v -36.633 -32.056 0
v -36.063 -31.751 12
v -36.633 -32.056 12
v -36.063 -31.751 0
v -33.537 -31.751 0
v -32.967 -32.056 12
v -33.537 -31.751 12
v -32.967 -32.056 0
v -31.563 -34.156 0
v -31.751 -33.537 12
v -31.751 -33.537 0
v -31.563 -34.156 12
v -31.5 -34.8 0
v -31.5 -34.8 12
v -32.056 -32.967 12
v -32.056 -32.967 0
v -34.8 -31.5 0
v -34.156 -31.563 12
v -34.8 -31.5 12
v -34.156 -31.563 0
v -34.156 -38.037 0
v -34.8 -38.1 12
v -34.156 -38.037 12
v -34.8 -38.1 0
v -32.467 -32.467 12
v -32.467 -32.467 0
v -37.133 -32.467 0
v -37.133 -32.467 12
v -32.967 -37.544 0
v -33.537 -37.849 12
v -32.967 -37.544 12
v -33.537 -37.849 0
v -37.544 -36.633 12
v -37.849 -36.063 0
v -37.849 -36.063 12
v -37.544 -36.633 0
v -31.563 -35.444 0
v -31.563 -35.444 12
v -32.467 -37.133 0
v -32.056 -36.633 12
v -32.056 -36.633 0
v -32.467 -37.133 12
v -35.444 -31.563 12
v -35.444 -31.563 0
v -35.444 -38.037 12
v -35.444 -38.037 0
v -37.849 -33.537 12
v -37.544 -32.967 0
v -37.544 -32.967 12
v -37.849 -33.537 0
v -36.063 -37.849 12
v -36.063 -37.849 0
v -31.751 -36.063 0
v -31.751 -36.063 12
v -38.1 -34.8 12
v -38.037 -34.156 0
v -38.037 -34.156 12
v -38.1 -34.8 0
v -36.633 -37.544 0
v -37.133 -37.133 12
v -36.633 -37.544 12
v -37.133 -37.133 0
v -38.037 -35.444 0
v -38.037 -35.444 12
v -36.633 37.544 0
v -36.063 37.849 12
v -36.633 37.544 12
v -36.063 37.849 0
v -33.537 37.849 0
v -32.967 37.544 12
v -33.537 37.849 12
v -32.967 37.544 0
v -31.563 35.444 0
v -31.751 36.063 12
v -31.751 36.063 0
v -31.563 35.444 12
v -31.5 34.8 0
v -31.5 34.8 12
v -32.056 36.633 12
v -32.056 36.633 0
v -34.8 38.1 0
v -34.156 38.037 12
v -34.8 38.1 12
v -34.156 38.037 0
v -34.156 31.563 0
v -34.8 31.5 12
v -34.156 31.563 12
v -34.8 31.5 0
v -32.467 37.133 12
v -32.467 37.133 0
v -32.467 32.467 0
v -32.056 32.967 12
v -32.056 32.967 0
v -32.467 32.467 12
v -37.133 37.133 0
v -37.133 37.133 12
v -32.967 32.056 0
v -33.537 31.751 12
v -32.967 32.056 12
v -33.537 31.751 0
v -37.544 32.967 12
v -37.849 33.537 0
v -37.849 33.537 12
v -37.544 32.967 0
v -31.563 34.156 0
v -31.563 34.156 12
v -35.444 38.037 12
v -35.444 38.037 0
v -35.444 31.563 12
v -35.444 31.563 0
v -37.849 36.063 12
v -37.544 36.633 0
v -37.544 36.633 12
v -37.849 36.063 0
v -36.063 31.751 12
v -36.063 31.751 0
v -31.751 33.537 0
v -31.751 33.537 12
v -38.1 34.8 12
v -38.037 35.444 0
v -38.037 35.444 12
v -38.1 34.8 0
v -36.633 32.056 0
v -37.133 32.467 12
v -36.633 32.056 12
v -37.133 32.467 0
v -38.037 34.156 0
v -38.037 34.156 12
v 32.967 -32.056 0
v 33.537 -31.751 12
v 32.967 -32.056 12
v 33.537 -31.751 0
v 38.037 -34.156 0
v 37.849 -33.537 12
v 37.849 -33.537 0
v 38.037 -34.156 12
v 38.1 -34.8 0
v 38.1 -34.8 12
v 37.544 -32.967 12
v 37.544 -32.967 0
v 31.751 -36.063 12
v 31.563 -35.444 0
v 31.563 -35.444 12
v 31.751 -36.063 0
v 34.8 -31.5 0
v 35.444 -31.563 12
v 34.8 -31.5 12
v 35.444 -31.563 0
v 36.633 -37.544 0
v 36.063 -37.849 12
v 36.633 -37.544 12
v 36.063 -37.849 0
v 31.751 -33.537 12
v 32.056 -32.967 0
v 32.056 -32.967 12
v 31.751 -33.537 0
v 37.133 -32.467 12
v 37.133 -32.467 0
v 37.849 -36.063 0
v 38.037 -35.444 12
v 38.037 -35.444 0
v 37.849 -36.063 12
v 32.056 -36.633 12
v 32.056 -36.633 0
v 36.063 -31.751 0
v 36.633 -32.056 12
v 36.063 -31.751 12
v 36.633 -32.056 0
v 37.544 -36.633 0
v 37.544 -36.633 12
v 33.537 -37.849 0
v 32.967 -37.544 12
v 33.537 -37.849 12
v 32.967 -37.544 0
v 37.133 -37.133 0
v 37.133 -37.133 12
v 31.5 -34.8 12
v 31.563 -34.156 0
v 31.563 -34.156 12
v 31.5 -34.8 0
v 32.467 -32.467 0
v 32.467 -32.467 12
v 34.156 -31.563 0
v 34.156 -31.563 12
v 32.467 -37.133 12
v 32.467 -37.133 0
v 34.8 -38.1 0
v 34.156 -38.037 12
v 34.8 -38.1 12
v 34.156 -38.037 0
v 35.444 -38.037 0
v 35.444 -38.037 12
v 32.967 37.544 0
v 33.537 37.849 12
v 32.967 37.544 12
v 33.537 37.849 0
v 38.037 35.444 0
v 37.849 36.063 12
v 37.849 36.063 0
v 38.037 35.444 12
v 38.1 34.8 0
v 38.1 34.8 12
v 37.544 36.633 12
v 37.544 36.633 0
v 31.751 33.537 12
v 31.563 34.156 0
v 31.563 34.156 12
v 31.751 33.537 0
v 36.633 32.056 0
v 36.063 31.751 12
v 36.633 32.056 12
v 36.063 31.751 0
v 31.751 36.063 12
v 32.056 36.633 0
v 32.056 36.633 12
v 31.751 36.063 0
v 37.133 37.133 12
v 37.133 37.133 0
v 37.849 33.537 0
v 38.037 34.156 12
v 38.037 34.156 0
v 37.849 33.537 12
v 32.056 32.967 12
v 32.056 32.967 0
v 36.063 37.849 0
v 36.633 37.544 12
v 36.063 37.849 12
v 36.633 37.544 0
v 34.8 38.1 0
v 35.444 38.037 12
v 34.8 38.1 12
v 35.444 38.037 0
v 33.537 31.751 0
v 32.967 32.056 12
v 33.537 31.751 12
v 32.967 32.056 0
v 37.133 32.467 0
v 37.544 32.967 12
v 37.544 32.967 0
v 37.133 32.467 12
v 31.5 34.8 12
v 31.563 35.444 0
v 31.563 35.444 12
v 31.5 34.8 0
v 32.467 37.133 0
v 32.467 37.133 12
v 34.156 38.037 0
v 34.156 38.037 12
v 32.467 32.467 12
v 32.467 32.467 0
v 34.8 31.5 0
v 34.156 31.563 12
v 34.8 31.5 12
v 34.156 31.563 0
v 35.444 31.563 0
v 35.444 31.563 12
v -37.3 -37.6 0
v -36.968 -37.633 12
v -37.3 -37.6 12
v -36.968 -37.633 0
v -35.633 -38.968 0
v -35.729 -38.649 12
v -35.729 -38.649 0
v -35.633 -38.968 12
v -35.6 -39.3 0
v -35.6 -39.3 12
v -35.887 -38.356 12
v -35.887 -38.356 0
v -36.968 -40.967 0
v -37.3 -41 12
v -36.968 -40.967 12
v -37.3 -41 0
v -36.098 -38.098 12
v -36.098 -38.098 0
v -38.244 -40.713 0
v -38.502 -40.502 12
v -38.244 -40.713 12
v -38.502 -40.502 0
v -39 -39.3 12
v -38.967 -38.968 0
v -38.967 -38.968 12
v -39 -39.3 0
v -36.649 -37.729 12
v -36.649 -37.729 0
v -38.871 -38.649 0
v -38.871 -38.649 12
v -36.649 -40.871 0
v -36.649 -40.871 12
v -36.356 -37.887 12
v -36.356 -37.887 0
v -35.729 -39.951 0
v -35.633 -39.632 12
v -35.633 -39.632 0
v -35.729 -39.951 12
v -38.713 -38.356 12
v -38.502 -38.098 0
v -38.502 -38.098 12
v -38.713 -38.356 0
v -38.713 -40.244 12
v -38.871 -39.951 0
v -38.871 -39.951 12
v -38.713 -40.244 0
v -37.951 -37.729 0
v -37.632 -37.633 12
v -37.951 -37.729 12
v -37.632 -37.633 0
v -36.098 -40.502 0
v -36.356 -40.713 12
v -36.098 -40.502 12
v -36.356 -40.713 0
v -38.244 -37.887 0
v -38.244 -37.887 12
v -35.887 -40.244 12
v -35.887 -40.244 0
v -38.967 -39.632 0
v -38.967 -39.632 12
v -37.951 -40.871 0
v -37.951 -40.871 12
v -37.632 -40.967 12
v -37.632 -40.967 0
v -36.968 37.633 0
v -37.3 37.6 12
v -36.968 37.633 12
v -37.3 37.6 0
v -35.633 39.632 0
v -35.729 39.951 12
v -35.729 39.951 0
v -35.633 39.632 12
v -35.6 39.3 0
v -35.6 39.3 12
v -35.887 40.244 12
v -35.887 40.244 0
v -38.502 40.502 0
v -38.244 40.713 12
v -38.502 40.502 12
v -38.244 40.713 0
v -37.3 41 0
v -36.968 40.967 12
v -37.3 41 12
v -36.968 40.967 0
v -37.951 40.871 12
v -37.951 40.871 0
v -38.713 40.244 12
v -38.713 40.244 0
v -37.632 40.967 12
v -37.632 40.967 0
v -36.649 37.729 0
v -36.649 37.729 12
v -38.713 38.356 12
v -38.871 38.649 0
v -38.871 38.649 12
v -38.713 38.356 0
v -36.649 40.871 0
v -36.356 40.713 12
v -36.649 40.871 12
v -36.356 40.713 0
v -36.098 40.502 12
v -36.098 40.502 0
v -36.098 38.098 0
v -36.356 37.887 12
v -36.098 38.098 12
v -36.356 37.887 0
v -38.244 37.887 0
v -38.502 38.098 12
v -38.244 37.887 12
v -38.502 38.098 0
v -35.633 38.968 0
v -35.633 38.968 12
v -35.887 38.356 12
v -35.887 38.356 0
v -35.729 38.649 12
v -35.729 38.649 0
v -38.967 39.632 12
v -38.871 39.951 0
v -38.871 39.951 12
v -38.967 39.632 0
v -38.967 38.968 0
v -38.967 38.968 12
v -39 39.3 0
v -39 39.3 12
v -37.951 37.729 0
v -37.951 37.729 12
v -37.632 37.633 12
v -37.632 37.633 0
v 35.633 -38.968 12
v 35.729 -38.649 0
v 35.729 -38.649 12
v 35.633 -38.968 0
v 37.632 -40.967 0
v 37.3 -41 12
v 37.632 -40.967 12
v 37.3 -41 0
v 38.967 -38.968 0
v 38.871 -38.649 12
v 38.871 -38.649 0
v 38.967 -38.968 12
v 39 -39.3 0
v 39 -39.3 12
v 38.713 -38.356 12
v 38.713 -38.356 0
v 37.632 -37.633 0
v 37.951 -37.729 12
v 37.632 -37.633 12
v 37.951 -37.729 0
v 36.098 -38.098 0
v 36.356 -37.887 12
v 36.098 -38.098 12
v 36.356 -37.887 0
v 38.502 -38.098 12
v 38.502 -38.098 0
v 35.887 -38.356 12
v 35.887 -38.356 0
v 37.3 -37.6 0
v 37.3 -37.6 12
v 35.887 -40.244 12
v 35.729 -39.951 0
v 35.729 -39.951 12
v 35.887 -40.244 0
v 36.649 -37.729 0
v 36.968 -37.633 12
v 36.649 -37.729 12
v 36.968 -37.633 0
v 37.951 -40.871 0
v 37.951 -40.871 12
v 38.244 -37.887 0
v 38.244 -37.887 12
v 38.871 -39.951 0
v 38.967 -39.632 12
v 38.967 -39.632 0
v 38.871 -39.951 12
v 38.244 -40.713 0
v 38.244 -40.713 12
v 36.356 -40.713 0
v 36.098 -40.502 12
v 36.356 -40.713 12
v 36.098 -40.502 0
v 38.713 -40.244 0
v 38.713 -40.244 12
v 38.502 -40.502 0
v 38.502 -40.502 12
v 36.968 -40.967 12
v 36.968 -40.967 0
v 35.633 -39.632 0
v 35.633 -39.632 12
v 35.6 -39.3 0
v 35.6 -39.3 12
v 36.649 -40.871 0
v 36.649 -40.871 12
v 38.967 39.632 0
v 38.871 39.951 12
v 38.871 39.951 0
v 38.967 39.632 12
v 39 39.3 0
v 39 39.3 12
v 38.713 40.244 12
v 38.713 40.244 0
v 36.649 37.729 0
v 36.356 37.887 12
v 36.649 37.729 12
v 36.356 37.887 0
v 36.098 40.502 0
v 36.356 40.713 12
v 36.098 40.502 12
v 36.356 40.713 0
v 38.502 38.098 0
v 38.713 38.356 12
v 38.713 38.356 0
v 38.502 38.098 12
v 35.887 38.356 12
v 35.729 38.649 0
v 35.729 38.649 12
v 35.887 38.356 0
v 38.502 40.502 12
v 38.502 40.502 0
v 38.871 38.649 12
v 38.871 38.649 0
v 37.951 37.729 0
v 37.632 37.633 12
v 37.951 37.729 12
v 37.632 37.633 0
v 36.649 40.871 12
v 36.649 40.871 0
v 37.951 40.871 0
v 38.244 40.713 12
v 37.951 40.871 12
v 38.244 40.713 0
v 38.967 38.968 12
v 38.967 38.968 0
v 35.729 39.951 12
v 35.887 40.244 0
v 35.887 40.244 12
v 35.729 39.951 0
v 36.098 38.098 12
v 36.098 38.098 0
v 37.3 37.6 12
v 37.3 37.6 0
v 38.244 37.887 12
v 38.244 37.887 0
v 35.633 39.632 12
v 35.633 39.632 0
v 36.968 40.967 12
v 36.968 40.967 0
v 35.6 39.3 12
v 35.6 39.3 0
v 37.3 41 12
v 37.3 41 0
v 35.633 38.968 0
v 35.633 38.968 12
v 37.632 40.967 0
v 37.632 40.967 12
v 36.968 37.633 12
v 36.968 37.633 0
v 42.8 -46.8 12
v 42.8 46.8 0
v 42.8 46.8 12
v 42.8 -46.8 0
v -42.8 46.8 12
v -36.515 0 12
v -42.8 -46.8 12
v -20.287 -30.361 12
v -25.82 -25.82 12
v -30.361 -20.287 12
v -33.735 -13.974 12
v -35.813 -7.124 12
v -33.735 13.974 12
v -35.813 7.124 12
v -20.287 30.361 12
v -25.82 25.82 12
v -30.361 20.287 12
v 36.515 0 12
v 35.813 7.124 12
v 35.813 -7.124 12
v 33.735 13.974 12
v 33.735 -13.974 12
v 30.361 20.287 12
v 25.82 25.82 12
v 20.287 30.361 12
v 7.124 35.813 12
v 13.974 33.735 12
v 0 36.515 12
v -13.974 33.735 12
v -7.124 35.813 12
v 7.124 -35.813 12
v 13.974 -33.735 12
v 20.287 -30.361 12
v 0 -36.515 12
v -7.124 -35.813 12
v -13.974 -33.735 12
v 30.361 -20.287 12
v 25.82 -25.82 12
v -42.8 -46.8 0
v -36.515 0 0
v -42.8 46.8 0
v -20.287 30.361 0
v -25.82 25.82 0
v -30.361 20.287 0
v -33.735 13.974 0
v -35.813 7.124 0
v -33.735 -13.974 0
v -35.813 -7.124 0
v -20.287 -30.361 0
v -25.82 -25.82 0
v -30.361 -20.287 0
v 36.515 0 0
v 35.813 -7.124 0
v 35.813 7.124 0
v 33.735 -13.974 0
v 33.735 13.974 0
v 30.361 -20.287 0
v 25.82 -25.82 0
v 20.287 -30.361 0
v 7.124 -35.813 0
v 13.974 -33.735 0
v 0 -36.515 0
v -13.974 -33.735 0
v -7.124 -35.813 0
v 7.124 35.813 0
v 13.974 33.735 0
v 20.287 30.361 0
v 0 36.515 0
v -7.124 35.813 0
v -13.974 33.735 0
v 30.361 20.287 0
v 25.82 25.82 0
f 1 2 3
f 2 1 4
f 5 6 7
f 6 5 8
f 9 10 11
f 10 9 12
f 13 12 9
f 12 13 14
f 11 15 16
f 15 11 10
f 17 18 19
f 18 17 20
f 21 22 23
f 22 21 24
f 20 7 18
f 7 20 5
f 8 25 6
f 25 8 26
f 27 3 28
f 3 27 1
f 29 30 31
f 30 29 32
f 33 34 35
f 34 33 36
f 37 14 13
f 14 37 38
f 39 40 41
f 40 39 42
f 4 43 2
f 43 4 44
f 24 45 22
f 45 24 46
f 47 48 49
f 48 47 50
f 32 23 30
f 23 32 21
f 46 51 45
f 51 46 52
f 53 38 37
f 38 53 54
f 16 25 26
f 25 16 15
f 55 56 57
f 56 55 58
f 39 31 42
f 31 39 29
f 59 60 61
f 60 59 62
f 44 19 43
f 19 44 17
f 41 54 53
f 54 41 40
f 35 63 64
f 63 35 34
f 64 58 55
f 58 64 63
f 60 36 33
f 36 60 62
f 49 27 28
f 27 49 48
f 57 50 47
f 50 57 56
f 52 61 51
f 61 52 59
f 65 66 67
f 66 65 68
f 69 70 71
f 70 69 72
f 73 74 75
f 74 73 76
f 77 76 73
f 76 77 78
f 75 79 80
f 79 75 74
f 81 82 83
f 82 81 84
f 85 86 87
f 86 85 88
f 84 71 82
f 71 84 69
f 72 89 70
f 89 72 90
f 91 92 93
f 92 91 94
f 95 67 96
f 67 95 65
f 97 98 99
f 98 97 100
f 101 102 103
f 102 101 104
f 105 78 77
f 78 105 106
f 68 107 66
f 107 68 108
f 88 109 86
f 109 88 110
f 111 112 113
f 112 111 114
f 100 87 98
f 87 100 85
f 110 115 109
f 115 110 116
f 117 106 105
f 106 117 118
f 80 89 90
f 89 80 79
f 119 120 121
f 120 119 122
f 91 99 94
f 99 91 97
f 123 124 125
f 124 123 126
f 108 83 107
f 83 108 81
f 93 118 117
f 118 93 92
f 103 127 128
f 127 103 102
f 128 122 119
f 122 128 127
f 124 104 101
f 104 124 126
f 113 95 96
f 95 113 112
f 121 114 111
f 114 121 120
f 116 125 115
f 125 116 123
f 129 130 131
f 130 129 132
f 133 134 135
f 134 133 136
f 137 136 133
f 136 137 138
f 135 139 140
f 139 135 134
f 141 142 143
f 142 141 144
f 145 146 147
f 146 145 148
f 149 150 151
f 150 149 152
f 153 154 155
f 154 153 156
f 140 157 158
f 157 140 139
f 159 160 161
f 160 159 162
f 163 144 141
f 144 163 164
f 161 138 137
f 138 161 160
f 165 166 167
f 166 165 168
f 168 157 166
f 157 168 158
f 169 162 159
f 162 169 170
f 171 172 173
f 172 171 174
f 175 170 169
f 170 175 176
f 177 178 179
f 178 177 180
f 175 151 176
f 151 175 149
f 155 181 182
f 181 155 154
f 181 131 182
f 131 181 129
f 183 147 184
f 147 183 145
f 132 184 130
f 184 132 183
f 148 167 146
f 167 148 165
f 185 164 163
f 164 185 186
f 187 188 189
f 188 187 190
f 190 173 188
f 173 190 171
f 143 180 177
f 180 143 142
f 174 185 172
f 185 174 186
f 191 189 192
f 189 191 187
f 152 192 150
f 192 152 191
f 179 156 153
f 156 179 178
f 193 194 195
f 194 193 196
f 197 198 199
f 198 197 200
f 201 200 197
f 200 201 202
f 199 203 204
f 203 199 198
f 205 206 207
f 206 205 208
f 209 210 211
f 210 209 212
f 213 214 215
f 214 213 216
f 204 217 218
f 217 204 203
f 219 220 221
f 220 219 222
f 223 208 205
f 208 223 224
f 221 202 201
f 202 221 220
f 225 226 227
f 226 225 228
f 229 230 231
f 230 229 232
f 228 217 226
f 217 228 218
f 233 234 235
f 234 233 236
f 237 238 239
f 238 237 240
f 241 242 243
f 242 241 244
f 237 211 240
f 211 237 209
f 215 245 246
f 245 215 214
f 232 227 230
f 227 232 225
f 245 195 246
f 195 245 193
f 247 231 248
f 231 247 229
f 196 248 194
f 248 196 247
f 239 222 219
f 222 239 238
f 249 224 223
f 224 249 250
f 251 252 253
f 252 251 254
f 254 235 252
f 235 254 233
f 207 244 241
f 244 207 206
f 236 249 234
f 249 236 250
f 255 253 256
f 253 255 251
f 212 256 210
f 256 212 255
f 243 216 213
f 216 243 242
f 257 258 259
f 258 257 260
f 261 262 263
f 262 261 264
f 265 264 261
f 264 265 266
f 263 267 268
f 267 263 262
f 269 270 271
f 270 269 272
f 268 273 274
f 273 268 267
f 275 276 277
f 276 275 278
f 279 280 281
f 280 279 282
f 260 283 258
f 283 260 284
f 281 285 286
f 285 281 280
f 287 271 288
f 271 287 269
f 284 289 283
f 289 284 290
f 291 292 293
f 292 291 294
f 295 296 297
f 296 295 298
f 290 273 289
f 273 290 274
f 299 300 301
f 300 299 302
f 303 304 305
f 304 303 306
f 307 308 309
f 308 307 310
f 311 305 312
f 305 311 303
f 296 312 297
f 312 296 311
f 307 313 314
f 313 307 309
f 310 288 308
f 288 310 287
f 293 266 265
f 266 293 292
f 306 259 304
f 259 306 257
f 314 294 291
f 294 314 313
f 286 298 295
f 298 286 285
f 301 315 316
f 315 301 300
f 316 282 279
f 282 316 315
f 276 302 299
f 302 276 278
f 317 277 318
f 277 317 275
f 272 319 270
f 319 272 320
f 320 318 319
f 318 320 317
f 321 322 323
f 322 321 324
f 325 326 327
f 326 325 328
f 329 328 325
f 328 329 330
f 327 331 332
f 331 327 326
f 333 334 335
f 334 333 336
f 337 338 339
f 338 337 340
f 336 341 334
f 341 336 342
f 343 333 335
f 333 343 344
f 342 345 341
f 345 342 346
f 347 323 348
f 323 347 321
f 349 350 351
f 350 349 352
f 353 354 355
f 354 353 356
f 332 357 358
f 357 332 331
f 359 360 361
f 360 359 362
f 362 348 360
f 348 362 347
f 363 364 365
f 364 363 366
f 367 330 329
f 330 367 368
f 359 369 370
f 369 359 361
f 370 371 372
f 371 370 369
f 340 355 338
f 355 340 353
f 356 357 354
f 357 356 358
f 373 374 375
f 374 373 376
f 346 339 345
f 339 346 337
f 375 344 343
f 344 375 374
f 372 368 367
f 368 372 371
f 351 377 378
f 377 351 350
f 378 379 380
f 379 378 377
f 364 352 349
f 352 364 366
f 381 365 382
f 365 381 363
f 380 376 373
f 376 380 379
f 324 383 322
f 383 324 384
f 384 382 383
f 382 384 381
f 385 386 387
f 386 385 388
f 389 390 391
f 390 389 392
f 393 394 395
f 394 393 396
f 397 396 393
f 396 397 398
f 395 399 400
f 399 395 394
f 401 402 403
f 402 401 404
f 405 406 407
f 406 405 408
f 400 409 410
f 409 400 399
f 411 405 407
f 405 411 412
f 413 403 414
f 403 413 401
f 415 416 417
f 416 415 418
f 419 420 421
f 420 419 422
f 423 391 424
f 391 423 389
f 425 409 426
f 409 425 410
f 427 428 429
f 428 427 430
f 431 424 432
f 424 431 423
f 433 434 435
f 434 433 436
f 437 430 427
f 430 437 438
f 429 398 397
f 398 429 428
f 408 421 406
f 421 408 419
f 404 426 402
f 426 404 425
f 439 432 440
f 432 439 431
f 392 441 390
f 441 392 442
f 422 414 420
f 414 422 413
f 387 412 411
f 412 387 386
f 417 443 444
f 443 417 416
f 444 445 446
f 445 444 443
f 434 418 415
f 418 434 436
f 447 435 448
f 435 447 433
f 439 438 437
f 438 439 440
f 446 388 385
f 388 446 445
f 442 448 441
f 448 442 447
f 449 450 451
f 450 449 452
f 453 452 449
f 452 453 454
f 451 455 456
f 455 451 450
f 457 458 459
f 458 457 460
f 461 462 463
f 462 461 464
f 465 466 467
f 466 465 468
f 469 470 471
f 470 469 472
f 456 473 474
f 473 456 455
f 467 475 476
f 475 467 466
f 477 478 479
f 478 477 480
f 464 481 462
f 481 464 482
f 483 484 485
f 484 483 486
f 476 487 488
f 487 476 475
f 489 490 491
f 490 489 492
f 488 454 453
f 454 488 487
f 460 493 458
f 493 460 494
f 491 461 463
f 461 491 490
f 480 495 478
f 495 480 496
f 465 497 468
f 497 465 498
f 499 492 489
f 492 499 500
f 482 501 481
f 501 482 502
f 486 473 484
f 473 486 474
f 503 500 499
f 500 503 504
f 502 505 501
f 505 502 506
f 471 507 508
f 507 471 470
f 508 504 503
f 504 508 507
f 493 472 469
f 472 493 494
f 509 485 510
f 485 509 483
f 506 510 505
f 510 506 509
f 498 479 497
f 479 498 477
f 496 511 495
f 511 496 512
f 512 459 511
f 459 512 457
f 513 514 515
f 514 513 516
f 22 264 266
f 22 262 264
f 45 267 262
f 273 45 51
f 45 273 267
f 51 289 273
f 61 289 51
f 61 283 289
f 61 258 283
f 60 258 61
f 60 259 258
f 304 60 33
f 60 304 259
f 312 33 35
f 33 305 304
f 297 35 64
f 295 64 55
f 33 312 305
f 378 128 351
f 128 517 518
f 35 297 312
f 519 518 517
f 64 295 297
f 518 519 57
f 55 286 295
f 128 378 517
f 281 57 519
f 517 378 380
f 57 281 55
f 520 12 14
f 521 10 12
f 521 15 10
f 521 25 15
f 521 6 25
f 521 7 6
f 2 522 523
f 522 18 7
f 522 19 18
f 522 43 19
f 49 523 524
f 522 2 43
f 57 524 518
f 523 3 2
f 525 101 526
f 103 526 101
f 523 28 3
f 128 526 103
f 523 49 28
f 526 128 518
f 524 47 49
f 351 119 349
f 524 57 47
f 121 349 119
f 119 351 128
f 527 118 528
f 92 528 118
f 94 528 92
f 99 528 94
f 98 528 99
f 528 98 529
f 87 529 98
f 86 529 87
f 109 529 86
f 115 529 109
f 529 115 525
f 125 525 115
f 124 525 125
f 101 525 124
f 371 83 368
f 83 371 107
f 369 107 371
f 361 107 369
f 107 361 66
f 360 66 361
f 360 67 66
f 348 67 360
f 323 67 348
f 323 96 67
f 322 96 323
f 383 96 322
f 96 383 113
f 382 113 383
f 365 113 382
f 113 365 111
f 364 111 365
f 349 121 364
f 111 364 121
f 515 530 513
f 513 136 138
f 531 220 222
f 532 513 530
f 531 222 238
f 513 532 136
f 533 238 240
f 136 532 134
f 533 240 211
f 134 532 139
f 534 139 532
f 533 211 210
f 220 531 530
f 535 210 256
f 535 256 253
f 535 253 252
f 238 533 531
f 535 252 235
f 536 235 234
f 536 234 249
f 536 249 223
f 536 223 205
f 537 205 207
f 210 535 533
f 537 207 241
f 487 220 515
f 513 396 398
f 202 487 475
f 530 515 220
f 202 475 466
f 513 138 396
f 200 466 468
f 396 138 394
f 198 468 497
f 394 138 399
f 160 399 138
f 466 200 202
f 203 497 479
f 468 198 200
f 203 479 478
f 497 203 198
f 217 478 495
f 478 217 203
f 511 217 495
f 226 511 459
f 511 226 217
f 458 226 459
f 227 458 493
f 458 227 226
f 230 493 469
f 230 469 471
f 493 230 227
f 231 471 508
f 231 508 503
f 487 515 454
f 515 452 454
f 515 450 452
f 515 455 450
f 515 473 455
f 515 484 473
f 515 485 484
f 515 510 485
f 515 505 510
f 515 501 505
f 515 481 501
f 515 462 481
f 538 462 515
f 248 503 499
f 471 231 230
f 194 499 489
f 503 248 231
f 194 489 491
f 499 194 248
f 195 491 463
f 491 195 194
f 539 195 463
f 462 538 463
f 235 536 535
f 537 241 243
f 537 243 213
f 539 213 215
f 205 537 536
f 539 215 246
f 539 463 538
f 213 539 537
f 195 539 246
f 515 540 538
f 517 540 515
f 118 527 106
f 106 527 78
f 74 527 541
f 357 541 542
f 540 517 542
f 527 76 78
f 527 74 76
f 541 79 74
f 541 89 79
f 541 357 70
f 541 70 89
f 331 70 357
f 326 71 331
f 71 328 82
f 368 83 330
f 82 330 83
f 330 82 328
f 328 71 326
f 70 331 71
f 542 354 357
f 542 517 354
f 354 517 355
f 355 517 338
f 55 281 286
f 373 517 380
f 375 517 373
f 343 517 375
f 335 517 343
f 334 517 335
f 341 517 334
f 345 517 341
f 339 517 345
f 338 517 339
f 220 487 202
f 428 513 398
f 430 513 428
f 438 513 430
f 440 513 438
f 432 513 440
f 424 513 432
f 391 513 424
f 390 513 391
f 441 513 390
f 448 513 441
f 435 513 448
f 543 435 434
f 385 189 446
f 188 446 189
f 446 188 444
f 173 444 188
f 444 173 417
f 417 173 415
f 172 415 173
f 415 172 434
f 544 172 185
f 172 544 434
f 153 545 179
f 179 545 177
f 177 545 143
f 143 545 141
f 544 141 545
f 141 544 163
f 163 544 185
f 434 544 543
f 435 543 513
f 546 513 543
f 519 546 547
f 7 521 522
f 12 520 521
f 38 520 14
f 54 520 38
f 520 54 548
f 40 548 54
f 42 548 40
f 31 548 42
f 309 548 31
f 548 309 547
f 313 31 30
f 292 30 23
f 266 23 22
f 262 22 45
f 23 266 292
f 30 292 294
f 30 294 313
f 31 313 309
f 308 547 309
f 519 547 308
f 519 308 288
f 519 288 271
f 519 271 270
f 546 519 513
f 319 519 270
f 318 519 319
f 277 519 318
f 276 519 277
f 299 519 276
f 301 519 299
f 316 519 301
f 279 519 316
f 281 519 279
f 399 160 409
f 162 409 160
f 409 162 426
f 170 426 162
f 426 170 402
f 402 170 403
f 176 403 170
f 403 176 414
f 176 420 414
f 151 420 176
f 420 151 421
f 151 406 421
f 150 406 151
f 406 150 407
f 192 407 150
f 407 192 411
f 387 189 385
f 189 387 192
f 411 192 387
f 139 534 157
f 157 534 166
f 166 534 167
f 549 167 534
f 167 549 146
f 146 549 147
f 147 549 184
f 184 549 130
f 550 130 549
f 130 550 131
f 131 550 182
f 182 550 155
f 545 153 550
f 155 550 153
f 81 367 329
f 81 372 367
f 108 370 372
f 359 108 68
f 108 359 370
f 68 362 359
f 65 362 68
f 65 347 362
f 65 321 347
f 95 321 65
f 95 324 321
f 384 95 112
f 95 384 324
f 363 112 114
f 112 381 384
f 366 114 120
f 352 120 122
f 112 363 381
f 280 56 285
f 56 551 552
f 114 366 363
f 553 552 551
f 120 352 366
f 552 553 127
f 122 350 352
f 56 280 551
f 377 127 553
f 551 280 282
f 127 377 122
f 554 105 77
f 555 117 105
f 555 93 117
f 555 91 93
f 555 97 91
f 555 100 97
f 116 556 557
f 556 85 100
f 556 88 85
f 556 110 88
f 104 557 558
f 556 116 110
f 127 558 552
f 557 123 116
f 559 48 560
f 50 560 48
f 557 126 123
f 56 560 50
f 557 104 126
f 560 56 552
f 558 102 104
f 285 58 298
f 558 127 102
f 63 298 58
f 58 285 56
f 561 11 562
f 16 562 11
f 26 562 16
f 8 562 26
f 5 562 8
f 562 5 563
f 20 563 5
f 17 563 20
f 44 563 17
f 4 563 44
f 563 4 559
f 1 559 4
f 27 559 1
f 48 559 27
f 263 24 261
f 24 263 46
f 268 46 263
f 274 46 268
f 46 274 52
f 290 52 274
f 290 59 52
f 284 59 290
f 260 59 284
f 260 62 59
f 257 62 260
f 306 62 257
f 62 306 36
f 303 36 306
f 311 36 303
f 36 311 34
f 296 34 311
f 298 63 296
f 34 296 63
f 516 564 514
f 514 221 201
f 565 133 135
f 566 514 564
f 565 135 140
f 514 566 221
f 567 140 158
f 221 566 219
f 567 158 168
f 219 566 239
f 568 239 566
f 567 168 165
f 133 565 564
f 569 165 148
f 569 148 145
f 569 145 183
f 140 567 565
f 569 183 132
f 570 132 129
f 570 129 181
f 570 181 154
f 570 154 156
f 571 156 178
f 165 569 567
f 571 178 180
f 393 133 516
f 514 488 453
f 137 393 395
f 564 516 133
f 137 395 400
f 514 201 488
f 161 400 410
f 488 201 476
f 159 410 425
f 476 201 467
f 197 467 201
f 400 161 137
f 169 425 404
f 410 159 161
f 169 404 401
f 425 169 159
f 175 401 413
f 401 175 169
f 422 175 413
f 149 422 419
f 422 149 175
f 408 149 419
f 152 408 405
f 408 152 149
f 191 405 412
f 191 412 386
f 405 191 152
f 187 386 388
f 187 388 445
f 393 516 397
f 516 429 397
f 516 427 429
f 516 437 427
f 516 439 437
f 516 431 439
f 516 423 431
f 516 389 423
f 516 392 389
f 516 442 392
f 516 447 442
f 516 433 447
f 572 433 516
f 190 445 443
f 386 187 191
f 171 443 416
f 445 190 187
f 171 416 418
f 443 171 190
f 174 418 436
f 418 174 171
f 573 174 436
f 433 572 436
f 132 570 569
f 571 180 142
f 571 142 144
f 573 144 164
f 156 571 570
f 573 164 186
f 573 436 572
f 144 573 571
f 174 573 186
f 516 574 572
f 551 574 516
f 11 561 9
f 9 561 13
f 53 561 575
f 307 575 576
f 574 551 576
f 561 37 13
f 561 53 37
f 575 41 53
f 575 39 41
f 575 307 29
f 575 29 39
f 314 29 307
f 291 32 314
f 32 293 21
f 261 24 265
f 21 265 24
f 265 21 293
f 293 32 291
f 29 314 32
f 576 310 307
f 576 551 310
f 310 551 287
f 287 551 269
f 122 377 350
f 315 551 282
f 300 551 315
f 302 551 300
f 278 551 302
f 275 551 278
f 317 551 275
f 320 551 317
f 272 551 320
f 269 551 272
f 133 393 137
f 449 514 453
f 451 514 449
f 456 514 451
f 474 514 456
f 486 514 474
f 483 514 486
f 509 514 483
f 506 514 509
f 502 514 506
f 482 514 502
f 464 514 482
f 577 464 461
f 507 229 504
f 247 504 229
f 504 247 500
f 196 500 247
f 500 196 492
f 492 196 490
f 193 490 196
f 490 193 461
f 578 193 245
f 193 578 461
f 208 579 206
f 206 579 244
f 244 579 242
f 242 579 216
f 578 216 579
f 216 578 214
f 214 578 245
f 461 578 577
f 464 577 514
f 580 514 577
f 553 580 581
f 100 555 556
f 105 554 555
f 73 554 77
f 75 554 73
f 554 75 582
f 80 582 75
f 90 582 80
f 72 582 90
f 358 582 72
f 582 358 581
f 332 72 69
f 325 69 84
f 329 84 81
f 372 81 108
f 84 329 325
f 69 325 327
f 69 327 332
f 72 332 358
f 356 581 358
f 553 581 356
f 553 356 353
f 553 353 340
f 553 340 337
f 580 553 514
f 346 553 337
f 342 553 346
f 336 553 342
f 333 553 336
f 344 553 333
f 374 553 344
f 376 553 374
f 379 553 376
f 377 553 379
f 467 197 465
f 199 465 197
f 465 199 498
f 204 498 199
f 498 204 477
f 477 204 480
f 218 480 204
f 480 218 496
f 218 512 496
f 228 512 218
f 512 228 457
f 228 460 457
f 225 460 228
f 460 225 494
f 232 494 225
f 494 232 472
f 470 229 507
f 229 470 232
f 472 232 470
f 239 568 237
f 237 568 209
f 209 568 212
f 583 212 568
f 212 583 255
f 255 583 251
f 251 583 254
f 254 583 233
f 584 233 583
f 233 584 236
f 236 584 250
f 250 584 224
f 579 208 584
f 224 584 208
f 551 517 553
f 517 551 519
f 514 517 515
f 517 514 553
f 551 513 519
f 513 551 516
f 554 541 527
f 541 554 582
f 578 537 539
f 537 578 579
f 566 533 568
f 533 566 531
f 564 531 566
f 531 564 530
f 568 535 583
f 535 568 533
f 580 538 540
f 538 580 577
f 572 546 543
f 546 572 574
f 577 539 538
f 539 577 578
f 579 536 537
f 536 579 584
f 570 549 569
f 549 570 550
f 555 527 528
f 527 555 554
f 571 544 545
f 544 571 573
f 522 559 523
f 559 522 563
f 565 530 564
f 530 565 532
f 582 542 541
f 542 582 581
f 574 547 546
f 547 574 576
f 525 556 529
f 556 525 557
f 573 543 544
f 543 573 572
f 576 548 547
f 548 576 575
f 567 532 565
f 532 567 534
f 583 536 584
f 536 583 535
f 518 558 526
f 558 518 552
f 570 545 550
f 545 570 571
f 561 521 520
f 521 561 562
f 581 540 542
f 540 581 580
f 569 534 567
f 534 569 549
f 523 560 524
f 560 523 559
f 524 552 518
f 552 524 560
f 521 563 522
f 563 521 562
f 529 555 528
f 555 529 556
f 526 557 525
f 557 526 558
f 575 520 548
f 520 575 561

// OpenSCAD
$fn = 32;

// ----------------------------------------------------------------------
// Motor mount plate: NEMA34, 85.6 x 93.6 x 12 mm
// ----------------------------------------------------------------------

// --- parameters (mm) ---
mount_w = 85.6;           // plate length, X
mount_d = 93.6;           // plate width, Y
mat_t = 12;               // plate thickness
motor_pitch = 69.6;       // NEMA34 bolt spacing
motor_d = 6.6;            // NEMA34 screw clearance
center_bore = 73.03;      // pilot boss bore
second_d = 3.4;           // second fastener hole

module plate() {
  translate([-mount_w / 2, -mount_d / 2, 0]) cube([mount_w, mount_d, mat_t]);
}

module motor_holes() {
  for (sx = [-1, 1]) for (sy = [-1, 1])
    translate([sx * motor_pitch / 2, sy * motor_pitch / 2, -1])
      cylinder(h = mat_t + 2, d = motor_d);
}

difference() {
  union() {
    plate();
  }
  motor_holes();
  translate([0, 0, -1]) cylinder(h = mat_t + 2, d = center_bore);
  for (sx = [-1, 1]) for (sy = [-1, 1])
    translate([sx * 37.3, sy * 39.3, -1]) cylinder(h = mat_t + 2, d = second_d);
}
